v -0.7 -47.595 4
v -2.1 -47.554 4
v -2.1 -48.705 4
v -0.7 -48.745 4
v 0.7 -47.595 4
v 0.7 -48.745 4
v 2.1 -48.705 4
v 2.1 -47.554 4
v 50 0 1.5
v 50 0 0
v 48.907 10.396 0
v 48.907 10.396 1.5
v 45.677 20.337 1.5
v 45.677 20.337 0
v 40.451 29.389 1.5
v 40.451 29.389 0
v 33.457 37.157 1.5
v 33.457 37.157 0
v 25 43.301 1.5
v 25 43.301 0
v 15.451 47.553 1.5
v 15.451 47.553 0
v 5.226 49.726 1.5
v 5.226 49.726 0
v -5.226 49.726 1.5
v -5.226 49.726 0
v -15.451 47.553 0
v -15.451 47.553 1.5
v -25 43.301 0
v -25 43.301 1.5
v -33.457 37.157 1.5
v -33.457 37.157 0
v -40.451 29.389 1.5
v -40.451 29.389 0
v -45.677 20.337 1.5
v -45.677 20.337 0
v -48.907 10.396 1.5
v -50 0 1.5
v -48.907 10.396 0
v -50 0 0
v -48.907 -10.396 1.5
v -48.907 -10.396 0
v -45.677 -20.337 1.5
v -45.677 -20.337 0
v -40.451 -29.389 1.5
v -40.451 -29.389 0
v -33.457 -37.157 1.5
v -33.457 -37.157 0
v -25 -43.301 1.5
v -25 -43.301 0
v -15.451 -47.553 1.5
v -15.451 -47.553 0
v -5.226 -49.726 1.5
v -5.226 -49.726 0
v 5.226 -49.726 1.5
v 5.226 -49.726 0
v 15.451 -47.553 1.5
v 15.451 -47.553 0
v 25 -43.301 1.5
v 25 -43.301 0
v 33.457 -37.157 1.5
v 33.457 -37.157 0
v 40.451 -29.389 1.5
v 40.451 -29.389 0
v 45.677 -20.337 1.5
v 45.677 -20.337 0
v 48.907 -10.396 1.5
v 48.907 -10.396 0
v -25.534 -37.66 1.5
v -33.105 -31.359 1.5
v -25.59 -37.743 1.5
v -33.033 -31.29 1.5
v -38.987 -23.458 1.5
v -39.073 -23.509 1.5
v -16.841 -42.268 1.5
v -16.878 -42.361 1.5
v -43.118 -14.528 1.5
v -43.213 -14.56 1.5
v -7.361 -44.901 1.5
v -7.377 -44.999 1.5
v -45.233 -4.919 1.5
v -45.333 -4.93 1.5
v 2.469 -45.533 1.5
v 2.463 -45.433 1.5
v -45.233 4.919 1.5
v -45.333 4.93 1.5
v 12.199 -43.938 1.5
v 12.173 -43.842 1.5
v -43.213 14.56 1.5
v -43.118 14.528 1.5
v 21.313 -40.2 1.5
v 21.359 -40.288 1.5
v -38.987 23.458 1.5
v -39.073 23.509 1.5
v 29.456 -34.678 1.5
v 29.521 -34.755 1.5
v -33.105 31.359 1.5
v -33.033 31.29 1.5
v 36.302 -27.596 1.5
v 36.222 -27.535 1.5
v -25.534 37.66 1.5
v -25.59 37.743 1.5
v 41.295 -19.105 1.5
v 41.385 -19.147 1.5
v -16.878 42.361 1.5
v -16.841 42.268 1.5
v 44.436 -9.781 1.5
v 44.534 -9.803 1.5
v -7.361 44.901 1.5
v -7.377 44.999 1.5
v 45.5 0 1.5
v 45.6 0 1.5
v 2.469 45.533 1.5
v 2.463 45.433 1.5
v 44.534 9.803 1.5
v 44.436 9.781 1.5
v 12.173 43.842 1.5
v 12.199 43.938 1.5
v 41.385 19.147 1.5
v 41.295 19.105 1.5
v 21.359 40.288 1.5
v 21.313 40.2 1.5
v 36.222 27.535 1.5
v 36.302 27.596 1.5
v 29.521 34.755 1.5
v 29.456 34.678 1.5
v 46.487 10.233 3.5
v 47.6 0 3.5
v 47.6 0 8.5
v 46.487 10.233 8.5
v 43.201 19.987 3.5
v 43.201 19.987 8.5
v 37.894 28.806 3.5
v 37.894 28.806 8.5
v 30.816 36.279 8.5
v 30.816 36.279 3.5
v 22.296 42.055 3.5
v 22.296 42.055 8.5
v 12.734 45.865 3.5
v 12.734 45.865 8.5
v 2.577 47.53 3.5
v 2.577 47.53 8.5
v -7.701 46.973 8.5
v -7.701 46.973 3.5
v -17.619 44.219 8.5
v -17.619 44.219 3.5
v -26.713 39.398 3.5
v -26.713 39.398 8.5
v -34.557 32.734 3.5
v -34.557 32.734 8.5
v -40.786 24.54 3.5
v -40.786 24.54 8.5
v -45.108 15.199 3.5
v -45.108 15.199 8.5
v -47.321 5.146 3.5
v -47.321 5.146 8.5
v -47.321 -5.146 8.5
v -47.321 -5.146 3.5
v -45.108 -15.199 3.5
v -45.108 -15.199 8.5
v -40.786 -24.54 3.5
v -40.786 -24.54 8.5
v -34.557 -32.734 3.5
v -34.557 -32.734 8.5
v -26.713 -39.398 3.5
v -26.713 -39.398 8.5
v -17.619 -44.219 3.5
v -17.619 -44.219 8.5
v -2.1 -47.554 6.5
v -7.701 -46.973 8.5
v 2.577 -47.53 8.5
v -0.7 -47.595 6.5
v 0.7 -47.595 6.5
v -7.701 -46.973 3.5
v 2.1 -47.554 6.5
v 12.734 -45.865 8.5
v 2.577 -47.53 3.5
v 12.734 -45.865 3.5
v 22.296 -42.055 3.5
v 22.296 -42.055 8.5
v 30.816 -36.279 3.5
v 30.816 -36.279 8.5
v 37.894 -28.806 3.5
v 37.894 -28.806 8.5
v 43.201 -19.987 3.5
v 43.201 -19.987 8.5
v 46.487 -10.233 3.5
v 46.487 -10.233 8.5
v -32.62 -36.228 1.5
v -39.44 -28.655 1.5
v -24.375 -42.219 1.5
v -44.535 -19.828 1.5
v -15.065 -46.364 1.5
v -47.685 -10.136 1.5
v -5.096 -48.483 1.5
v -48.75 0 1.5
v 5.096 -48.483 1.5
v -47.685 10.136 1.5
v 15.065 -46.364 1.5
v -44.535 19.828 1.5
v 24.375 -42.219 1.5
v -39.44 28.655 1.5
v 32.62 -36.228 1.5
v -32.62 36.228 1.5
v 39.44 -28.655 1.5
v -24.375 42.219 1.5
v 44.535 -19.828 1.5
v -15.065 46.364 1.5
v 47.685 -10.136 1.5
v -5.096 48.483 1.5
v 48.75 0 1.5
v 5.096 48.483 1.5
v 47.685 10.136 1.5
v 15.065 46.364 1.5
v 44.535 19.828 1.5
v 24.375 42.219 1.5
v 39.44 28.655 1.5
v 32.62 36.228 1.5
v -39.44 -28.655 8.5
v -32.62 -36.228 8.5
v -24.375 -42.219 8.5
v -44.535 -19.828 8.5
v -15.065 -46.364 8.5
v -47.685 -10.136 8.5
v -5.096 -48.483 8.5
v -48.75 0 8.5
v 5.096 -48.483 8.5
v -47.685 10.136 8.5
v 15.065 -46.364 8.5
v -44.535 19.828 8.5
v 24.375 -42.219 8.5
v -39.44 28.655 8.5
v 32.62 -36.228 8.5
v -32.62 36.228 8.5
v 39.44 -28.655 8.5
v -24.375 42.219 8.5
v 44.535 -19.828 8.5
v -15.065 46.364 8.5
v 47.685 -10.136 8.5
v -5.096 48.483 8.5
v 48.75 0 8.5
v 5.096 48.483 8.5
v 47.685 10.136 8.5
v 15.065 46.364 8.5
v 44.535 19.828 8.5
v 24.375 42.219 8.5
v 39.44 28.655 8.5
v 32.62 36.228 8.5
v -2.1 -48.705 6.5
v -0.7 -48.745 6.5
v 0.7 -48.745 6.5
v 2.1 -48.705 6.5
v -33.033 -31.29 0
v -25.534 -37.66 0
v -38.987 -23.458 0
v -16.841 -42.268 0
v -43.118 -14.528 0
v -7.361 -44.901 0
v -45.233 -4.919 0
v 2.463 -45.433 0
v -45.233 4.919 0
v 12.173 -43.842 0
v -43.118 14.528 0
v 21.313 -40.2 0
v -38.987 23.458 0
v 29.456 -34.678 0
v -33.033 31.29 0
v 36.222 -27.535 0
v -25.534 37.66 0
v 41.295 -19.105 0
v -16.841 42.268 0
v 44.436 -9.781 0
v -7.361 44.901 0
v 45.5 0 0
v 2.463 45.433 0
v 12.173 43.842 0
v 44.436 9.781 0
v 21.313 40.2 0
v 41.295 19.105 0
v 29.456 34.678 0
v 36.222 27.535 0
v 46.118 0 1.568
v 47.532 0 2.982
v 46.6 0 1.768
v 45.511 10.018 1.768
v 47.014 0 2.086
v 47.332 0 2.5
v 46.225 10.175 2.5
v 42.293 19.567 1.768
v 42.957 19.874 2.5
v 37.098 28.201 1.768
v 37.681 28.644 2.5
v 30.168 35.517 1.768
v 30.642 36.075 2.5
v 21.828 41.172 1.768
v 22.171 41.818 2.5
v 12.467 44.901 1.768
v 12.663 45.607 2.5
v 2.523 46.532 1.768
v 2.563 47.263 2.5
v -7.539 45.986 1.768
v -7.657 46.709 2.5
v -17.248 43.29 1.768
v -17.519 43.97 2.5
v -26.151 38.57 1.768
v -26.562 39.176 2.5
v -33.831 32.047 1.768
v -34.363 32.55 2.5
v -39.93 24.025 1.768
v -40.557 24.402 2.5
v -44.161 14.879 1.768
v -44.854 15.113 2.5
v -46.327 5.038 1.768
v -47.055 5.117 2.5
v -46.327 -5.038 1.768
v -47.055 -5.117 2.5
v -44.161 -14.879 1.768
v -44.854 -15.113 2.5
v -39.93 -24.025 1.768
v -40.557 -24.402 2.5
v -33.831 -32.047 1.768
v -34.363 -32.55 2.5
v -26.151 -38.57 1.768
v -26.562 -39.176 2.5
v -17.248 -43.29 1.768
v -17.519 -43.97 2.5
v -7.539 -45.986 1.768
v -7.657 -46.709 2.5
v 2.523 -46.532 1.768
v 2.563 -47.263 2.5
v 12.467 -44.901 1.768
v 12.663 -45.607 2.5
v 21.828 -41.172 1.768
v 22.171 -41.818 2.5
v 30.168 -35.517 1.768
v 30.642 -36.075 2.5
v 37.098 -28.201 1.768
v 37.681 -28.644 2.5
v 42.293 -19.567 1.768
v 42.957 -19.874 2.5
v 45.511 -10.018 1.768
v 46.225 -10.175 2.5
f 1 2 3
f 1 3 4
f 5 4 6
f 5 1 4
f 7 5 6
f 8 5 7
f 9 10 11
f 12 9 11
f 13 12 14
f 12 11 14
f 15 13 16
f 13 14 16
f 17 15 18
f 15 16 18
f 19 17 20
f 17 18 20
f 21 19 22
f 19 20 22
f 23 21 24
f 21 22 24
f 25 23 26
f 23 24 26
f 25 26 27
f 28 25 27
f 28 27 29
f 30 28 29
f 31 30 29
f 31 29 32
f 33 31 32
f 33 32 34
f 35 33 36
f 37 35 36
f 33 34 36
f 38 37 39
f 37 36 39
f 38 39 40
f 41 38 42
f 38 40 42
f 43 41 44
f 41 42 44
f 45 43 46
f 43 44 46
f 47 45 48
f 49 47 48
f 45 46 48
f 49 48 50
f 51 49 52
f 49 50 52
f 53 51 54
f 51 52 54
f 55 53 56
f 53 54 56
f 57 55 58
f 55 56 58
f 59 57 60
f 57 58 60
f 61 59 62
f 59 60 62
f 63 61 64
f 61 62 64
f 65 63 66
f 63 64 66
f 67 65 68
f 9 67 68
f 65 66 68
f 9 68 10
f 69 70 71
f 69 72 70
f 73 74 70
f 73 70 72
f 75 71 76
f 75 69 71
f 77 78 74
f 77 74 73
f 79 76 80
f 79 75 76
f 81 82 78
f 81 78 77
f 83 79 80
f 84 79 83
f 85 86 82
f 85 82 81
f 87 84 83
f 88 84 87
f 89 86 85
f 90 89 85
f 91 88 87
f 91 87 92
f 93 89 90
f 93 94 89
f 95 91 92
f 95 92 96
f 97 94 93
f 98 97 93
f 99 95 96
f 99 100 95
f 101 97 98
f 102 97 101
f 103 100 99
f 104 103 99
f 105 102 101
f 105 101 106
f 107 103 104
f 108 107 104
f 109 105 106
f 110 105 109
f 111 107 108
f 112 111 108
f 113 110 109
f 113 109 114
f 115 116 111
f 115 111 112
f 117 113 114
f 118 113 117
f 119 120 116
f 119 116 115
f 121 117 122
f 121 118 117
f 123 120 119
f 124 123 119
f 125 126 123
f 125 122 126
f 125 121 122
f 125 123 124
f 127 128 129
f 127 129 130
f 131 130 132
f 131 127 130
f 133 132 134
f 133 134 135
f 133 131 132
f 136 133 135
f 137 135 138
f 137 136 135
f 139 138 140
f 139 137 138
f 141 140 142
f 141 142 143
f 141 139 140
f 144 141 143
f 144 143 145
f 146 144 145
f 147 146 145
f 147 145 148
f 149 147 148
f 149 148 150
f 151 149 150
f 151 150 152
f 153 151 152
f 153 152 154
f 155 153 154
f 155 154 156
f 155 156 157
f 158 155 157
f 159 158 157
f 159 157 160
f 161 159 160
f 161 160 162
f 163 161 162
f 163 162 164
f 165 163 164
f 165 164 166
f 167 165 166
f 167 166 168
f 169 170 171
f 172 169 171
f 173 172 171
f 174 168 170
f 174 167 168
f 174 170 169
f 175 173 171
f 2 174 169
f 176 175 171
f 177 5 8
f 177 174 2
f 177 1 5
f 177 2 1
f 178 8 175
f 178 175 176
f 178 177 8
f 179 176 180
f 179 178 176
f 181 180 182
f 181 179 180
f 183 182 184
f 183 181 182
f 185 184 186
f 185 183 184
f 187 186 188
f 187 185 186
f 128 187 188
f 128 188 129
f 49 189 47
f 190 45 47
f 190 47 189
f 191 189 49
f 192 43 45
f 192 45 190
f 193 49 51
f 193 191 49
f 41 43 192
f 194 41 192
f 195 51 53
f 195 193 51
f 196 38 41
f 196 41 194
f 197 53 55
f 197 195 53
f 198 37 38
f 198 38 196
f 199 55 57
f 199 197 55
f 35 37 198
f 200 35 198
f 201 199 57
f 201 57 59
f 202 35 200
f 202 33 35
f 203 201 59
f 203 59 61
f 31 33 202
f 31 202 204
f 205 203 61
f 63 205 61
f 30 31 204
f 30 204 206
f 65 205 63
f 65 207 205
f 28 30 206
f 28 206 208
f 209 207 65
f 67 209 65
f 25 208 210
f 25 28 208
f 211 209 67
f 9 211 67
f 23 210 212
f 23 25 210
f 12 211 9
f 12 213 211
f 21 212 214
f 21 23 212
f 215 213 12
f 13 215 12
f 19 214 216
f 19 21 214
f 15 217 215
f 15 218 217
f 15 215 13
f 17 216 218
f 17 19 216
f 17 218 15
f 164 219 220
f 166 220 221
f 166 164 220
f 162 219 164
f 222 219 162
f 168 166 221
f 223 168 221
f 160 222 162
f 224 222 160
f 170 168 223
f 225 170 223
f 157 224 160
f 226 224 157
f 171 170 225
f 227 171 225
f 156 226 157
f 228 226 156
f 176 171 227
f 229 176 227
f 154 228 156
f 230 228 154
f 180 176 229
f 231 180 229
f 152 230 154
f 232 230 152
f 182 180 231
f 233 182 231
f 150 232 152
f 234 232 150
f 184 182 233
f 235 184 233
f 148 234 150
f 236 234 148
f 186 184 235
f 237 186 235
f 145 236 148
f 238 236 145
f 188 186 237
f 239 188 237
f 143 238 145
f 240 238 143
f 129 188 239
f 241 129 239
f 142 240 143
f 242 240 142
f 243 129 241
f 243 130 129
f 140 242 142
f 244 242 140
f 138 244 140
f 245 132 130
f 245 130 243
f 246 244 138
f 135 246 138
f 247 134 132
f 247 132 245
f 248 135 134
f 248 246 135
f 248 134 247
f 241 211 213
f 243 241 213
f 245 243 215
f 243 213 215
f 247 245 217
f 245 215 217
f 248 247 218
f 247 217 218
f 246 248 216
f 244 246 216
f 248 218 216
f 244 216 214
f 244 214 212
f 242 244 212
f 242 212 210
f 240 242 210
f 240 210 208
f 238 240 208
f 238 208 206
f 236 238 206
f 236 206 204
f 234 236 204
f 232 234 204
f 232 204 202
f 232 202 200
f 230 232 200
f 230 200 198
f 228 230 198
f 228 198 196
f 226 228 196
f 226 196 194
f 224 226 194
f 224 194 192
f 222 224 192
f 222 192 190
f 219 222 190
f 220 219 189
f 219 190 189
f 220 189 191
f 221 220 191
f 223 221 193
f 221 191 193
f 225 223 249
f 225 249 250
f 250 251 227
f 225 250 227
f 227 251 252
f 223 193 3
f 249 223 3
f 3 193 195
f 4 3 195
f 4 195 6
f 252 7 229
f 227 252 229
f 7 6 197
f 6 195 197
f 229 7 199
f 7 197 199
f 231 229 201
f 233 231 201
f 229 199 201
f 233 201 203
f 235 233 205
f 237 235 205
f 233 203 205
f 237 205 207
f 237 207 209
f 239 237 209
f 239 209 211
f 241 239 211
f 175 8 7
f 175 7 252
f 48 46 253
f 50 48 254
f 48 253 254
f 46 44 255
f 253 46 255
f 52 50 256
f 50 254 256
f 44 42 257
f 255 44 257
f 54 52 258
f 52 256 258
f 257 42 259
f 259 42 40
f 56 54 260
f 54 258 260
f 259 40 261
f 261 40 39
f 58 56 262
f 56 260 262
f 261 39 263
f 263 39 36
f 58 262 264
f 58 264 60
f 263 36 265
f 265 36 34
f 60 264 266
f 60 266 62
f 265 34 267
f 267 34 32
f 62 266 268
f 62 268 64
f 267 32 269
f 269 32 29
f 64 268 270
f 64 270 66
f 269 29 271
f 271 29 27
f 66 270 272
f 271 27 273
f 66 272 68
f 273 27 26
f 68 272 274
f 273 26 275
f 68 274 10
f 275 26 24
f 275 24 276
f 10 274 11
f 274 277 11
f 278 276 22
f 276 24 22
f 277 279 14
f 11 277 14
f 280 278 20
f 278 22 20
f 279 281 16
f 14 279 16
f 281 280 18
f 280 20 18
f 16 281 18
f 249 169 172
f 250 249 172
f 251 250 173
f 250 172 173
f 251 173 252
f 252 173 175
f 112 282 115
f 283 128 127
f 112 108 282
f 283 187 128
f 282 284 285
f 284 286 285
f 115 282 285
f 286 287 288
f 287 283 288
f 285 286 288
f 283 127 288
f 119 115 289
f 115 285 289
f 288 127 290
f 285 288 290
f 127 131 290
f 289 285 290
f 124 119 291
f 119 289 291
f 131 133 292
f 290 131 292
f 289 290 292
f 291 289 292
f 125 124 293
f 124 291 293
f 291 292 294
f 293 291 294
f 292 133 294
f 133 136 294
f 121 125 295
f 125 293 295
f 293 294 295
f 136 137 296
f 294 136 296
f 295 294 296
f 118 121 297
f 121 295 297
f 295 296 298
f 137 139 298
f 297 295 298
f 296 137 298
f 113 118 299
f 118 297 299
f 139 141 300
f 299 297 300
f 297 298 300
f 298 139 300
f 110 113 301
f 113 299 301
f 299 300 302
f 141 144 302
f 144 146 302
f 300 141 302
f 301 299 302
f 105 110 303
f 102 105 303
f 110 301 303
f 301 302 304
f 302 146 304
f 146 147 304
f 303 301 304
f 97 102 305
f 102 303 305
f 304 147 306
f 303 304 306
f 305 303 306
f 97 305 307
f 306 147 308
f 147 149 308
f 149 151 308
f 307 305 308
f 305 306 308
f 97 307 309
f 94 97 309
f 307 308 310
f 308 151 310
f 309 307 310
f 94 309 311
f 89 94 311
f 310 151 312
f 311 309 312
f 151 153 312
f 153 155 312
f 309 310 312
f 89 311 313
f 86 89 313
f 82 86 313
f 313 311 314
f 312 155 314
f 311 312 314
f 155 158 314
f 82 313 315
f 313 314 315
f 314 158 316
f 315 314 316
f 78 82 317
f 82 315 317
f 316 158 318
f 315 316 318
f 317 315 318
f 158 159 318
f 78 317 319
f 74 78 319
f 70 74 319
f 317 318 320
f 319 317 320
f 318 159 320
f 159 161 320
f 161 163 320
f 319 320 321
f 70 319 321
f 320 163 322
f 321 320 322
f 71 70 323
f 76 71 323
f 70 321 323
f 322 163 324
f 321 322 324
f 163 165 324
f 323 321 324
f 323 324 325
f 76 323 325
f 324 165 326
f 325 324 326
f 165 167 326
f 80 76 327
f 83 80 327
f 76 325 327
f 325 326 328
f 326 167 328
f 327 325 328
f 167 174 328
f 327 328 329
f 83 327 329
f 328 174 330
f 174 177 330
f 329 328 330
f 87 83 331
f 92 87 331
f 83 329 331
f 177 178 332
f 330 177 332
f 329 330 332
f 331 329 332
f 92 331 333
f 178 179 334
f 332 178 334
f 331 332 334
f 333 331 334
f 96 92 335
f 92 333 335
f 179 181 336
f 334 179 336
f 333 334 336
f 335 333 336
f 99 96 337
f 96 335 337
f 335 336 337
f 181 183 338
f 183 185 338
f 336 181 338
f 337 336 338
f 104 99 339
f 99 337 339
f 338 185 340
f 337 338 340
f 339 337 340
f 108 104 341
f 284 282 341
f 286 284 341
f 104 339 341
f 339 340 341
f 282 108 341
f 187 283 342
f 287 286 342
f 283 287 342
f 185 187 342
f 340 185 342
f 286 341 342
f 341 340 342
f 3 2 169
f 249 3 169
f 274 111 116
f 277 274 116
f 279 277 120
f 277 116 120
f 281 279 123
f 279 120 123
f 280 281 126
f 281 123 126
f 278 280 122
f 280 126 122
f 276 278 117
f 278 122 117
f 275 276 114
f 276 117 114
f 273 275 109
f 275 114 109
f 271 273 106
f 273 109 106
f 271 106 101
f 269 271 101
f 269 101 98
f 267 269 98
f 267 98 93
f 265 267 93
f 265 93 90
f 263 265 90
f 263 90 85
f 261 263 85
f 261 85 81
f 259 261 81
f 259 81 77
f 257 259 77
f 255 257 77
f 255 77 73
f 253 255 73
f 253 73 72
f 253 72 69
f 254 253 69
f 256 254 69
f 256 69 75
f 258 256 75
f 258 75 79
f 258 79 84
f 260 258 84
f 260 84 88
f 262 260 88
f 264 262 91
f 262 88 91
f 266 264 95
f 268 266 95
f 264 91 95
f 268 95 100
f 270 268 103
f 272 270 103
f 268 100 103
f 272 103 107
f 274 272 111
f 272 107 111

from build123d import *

# Parameters (mm, degrees)
F0_R     = 50
F1_DEPTH = 1.5
F2_R     = 48.75
F2_R_2   = 47.6
F3_DEPTH = 7
F4_R     = 45.5
F5_DEPTH = 25
F6_W     = 4.2
F6_H     = 2.5
F7_DEPTH = 150.9
F8_R     = 2


with BuildPart() as f1:
    # F0 (on Top) → F1 (new body)
    with BuildSketch(Plane.XY):
        Circle(F0_R)
    extrude(amount=F1_DEPTH)

    # F2 (on face) → F3 (join)
    with BuildSketch(Plane.XY.offset(1.5)):
        Circle(F2_R)
        Circle(F2_R_2, mode=Mode.SUBTRACT)
    extrude(amount=F3_DEPTH)

    # F4 (on face) → F5 (cut)
    with BuildSketch(Plane.XY.offset(1.5)):
        Circle(F4_R)
    extrude(amount=-F5_DEPTH, mode=Mode.SUBTRACT)

    # F6 (on Front) → F7 (cut)
    with BuildSketch(Plane.XZ):
        with Locations((0, 5.25)):
            Rectangle(F6_W, F6_H)
    extrude(amount=F7_DEPTH, mode=Mode.SUBTRACT)

    # F8
    f8_edges = [f1.edges().sort_by_distance(p)[0] for p in [
        (-47.6, 0, 1.5),
    ]]
    fillet(f8_edges, radius=F8_R)


solid = f1.part
